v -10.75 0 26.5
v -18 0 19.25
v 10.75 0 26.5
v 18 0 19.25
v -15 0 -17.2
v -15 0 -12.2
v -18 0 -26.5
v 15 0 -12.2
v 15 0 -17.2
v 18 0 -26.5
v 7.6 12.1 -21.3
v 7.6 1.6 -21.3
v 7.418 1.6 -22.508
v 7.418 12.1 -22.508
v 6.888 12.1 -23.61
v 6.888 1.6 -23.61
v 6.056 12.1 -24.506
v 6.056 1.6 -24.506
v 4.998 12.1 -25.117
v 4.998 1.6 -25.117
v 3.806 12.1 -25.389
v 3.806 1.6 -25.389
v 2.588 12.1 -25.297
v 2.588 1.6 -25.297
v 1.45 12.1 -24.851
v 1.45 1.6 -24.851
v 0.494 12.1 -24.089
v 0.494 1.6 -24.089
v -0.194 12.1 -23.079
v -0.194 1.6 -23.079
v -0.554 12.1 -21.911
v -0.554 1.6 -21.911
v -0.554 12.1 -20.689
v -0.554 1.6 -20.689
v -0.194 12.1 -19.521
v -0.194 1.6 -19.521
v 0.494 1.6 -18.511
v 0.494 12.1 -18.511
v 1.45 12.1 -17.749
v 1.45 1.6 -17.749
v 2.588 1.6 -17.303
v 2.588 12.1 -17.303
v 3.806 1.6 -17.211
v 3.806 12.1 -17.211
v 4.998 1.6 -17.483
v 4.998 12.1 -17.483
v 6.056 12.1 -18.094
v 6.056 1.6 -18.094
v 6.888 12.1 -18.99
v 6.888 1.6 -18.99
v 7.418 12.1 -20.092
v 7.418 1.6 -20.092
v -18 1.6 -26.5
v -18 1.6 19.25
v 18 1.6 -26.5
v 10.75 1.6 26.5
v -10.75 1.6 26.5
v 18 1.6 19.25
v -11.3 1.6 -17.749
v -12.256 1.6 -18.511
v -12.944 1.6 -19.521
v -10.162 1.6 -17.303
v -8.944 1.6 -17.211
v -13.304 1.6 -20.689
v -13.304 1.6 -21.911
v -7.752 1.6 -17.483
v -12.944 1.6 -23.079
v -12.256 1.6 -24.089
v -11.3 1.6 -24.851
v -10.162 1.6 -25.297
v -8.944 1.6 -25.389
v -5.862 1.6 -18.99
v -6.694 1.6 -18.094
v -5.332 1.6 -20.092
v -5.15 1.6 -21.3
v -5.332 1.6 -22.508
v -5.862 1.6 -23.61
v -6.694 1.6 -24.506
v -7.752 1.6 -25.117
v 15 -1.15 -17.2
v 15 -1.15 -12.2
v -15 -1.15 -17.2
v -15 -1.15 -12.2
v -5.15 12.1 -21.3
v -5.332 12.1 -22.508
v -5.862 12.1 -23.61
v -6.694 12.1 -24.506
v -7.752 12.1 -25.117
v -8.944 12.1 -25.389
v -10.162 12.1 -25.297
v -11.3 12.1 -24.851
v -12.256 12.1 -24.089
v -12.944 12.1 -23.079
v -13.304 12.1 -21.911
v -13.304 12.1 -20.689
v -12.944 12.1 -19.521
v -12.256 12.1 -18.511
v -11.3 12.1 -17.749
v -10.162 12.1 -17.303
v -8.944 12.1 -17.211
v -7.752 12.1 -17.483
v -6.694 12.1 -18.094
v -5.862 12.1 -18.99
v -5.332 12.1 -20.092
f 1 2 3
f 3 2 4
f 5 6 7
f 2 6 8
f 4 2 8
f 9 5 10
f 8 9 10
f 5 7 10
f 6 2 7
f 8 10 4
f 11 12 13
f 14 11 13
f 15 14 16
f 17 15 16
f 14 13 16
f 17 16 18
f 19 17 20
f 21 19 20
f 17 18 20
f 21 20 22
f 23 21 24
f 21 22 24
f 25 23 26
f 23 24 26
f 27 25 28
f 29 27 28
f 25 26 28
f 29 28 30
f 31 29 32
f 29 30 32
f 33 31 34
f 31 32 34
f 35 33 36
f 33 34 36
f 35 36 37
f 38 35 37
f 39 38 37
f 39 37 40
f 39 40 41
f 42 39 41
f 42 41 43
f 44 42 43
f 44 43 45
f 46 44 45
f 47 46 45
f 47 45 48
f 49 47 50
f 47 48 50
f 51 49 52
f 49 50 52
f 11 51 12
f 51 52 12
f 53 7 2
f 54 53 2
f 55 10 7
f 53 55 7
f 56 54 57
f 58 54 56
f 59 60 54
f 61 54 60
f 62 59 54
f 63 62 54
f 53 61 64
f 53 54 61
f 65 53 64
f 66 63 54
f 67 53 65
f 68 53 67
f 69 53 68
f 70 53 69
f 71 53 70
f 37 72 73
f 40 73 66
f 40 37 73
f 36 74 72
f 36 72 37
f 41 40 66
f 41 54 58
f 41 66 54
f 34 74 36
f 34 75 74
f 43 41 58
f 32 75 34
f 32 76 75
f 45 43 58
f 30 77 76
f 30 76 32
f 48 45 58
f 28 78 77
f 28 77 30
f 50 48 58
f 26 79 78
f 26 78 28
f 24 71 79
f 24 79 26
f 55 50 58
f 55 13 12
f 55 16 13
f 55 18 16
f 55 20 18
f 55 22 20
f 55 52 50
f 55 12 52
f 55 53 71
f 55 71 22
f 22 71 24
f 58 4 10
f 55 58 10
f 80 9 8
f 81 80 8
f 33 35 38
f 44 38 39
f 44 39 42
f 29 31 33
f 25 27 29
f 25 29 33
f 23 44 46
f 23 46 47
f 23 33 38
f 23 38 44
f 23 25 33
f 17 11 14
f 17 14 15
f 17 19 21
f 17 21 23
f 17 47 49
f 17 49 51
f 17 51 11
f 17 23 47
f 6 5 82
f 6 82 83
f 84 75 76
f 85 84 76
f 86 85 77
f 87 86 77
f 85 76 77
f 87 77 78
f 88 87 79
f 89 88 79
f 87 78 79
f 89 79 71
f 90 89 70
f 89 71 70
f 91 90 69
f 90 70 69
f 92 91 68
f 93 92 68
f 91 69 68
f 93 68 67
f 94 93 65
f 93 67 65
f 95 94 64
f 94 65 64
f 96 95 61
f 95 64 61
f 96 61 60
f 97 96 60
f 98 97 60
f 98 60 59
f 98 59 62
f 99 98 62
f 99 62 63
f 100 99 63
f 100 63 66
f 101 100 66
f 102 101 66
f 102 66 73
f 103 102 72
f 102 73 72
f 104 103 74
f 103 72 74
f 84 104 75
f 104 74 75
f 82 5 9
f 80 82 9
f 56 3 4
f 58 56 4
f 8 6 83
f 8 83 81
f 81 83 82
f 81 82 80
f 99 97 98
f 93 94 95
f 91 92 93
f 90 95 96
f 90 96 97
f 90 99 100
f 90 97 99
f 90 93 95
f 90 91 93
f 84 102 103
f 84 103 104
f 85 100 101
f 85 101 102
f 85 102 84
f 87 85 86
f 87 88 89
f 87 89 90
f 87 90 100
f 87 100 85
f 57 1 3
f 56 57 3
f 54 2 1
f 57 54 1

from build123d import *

# Parameters (mm, degrees)
BOSS_EXTRUDE1_DEPTH = 1.6
SKETCH2_W           = 30
SKETCH2_H           = 5
BOSS_EXTRUDE2_DEPTH = 1.15
SKETCH3_R           = 4.1
BOSS_EXTRUDE3_DEPTH = 10.5


with BuildPart() as part:
    # Sketch1 → Boss-Extrude1 (new body)
    with BuildSketch(Plane(origin=(0, 0, 0), x_dir=(1, 0, 0), z_dir=(0, 1, 0))):
        Polygon((-18, 26.5), (-18, -19.25), (-10.75, -26.5), (10.75, -26.5), (18, -19.25), (18, 26.5), align=None)
    extrude(amount=BOSS_EXTRUDE1_DEPTH)

    # Sketch2 → Boss-Extrude2 (add)
    with BuildSketch(Plane.XZ):
        with Locations((0, -14.7)):
            Rectangle(SKETCH2_W, SKETCH2_H)
    extrude(amount=BOSS_EXTRUDE2_DEPTH)

    # Sketch3 → Boss-Extrude3 (add)
    with BuildSketch(Plane(origin=(0, 1.6, 0), x_dir=(1, 0, 0), z_dir=(0, 1, 0))):
        with Locations((-9.25, 21.3)):
            Circle(SKETCH3_R)
        with Locations((3.5, 21.3)):
            Circle(SKETCH3_R)
    extrude(amount=BOSS_EXTRUDE3_DEPTH)


solid = part.part
